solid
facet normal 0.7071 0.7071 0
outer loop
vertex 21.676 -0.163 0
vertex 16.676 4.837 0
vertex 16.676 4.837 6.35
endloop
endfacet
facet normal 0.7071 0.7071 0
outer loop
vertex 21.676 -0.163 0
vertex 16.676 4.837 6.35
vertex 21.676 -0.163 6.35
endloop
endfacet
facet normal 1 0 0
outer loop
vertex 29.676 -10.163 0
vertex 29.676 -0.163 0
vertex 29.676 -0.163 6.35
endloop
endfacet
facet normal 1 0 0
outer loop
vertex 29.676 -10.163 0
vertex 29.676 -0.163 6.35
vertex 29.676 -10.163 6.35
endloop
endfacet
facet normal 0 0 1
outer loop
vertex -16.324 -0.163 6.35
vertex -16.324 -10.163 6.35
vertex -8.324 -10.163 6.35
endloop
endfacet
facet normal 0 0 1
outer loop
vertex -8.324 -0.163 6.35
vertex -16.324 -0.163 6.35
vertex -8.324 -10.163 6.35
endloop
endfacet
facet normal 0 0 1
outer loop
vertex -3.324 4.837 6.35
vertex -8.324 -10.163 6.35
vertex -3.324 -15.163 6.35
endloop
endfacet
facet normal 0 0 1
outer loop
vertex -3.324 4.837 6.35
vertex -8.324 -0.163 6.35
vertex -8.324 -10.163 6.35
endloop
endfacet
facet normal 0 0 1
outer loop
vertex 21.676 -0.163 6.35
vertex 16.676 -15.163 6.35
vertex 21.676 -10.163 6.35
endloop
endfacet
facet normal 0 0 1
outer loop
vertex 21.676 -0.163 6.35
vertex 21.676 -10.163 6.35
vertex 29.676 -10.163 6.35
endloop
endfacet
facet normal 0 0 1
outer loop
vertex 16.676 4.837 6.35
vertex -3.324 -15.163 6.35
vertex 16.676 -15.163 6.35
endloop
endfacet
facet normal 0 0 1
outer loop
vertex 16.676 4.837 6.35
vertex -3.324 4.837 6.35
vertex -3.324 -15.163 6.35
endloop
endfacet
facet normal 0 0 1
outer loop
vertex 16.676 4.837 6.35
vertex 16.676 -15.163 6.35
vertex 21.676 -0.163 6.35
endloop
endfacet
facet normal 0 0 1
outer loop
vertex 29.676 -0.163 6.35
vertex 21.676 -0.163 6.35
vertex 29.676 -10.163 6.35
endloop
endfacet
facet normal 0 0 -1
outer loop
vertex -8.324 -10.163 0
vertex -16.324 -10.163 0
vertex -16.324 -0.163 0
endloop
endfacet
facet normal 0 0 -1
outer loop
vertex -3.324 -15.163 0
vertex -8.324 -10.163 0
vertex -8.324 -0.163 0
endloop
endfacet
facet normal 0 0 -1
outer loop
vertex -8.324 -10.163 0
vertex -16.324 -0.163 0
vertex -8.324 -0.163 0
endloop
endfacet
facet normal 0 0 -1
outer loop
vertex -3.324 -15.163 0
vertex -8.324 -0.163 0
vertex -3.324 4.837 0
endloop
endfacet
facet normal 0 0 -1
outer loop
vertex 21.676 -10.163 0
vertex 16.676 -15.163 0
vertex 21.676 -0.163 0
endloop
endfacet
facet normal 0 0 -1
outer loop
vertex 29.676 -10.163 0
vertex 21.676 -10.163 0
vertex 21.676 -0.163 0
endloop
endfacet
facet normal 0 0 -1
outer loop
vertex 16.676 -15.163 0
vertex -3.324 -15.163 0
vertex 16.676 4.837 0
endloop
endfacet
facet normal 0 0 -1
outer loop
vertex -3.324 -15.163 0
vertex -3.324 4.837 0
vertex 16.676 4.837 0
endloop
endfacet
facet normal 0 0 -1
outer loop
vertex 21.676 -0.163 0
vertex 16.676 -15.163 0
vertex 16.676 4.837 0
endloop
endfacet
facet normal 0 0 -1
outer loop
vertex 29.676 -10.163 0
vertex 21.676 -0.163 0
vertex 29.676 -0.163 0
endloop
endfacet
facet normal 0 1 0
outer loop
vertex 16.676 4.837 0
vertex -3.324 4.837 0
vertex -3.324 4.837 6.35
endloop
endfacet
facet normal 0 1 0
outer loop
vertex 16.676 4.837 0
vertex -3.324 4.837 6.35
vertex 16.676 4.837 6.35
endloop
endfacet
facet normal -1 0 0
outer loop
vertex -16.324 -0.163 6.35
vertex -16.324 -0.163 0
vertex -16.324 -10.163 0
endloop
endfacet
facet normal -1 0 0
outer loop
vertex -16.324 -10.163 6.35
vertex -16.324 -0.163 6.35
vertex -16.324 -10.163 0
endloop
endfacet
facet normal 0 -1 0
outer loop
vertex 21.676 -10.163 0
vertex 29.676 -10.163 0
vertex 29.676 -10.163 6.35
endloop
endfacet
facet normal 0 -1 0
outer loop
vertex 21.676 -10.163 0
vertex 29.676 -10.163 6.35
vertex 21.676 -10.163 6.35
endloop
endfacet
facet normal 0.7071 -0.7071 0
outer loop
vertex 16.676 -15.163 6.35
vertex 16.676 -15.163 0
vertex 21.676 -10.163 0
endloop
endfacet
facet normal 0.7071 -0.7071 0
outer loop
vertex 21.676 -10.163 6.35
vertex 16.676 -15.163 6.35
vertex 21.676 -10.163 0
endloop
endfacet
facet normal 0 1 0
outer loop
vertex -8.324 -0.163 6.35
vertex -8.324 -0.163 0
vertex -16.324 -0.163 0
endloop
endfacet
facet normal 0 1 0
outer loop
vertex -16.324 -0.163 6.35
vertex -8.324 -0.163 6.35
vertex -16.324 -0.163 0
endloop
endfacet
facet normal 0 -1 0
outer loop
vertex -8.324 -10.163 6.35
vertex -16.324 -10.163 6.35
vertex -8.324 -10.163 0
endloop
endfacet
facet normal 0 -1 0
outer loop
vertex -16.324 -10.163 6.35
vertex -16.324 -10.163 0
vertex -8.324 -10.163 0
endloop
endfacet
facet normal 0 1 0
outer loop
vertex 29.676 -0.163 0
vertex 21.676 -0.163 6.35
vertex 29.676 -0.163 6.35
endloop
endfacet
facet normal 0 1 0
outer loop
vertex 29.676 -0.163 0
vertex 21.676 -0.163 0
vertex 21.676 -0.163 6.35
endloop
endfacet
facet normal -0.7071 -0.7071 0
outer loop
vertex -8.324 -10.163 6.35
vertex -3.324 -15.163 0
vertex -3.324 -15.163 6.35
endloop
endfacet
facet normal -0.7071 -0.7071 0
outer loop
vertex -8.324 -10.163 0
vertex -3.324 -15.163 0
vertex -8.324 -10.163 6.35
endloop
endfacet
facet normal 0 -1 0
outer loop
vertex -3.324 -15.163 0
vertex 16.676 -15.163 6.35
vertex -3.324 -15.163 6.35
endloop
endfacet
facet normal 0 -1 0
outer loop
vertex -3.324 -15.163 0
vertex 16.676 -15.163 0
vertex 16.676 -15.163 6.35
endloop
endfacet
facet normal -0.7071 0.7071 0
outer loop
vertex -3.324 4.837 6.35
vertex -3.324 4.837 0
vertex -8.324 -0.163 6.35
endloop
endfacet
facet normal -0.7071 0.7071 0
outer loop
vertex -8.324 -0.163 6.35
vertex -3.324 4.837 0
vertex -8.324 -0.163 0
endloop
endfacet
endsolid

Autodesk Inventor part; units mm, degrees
ref_plane "YZ Plane" through (0, 0, 0) normal (1, 0, 0) x (0, 1, 0)
ref_plane "XZ Plane" through (0, 0, 0) normal (0, 1, 0) x (-1, 0, 0)
ref_plane "XY Plane" through (0, 0, 0) normal (0, 0, 1) x (1, 0, 0)
sketch "Sketch1" plane through (0, 0, 0) normal (0, 0, 1) x (1, 0, 0)
  line L0 (-3.3239, 4.8371) -> (16.6761, 4.8371)
  line L1 (16.6761, 4.8371) -> (16.6761, -15.1629)
  line L2 (16.6761, -15.1629) -> (-3.3239, -15.1629)
  line L3 (-3.3239, -15.1629) -> (-3.3239, 4.8371)
  line L4 (14.5634, -0.1629) -> (29.6761, -0.1629)
  line L5 (29.6761, -0.1629) -> (29.6761, -10.1629)
  line L6 (29.6761, -10.1629) -> (14.5634, -10.1629)
  line L7 (14.5634, -10.1629) -> (14.5634, -0.1629)
  line L8 (-1.0107, -0.1629) -> (-16.3239, -0.1629)
  line L9 (-16.3239, -0.1629) -> (-16.3239, -10.1629)
  line L10 (-16.3239, -10.1629) -> (-1.0107, -10.1629)
  line L11 (-1.0107, -10.1629) -> (-1.0107, -0.1629)
  line L12 (-3.3239, 4.8371) -> (-8.3239, -0.1629)
  line L13 (16.6761, 4.8371) -> (21.6761, -0.1629)
  line L14 (-3.3239, -15.1629) -> (-8.3239, -10.1629)
  line L15 (16.6761, -15.1629) -> (21.6761, -10.1629)
  point P0 (0, 0)
  dimension "d0" = 20
  dimension "d1" = 20
  dimension "d2" = 10
  dimension "d3" = 10
  dimension "d4" = 0
  dimension "d5" = 5
  dimension "d6" = 13
  dimension "d7" = 13
  dimension "d10" = 45
  dimension "d11" = 45
  dimension "d12" = 45
extrude "Extrusion1" add sketch "Sketch1" along normal blind 6.35
properties part number "ColdFingerStem"
